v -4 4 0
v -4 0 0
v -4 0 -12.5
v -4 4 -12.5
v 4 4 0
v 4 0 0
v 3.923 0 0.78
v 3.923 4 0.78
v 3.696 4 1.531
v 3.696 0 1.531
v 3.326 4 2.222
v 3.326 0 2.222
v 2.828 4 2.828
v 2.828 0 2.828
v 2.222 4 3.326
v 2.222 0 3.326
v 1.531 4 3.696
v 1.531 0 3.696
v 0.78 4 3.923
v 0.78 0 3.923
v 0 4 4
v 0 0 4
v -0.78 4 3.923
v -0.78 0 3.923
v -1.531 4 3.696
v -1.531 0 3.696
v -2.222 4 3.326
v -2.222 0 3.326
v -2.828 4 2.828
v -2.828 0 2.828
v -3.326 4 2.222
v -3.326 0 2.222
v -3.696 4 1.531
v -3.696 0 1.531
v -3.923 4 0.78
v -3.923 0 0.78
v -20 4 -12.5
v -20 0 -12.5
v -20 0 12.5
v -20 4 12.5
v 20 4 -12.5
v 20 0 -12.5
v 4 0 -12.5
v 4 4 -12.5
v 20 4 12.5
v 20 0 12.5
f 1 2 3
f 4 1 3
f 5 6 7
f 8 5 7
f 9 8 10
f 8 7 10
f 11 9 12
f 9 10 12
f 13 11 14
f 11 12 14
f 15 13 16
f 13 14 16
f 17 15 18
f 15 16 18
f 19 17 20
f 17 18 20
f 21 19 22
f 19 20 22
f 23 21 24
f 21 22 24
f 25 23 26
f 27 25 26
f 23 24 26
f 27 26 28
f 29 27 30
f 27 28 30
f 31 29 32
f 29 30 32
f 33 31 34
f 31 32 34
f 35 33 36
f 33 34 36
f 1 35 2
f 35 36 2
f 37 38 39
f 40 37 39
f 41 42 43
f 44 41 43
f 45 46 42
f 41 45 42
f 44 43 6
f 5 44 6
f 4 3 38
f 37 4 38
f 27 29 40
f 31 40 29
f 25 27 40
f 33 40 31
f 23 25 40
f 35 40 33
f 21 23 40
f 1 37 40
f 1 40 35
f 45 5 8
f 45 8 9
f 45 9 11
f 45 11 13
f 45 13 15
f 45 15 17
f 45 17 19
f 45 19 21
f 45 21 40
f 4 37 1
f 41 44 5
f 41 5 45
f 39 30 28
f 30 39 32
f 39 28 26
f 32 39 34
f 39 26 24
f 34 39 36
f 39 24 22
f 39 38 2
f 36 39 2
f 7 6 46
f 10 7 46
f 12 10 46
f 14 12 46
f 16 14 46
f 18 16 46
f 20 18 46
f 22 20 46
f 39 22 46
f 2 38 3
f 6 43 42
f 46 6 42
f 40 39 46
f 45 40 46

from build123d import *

# Parameters (mm, degrees)
BOSS_EXTRUDE1_DEPTH = 4


with BuildPart() as part:
    # Sketch1 → Boss-Extrude1 (new body)
    with BuildSketch(Plane(origin=(0, 0, 0), x_dir=(1, 0, 0), z_dir=(0, 1, 0))):
        with BuildLine():
            Line((-4, 0), (-4, 12.5))
            Line((-4, 12.5), (-20, 12.5))
            Line((-20, 12.5), (-20, -12.5))
            Line((-20, -12.5), (20, -12.5))
            Line((20, -12.5), (20, 12.5))
            Line((20, 12.5), (4, 12.5))
            Line((4, 12.5), (4, 0))
            ThreePointArc((4, 0), (0, -4), (-4, 0))
        make_face()
    extrude(amount=BOSS_EXTRUDE1_DEPTH)


solid = part.part
